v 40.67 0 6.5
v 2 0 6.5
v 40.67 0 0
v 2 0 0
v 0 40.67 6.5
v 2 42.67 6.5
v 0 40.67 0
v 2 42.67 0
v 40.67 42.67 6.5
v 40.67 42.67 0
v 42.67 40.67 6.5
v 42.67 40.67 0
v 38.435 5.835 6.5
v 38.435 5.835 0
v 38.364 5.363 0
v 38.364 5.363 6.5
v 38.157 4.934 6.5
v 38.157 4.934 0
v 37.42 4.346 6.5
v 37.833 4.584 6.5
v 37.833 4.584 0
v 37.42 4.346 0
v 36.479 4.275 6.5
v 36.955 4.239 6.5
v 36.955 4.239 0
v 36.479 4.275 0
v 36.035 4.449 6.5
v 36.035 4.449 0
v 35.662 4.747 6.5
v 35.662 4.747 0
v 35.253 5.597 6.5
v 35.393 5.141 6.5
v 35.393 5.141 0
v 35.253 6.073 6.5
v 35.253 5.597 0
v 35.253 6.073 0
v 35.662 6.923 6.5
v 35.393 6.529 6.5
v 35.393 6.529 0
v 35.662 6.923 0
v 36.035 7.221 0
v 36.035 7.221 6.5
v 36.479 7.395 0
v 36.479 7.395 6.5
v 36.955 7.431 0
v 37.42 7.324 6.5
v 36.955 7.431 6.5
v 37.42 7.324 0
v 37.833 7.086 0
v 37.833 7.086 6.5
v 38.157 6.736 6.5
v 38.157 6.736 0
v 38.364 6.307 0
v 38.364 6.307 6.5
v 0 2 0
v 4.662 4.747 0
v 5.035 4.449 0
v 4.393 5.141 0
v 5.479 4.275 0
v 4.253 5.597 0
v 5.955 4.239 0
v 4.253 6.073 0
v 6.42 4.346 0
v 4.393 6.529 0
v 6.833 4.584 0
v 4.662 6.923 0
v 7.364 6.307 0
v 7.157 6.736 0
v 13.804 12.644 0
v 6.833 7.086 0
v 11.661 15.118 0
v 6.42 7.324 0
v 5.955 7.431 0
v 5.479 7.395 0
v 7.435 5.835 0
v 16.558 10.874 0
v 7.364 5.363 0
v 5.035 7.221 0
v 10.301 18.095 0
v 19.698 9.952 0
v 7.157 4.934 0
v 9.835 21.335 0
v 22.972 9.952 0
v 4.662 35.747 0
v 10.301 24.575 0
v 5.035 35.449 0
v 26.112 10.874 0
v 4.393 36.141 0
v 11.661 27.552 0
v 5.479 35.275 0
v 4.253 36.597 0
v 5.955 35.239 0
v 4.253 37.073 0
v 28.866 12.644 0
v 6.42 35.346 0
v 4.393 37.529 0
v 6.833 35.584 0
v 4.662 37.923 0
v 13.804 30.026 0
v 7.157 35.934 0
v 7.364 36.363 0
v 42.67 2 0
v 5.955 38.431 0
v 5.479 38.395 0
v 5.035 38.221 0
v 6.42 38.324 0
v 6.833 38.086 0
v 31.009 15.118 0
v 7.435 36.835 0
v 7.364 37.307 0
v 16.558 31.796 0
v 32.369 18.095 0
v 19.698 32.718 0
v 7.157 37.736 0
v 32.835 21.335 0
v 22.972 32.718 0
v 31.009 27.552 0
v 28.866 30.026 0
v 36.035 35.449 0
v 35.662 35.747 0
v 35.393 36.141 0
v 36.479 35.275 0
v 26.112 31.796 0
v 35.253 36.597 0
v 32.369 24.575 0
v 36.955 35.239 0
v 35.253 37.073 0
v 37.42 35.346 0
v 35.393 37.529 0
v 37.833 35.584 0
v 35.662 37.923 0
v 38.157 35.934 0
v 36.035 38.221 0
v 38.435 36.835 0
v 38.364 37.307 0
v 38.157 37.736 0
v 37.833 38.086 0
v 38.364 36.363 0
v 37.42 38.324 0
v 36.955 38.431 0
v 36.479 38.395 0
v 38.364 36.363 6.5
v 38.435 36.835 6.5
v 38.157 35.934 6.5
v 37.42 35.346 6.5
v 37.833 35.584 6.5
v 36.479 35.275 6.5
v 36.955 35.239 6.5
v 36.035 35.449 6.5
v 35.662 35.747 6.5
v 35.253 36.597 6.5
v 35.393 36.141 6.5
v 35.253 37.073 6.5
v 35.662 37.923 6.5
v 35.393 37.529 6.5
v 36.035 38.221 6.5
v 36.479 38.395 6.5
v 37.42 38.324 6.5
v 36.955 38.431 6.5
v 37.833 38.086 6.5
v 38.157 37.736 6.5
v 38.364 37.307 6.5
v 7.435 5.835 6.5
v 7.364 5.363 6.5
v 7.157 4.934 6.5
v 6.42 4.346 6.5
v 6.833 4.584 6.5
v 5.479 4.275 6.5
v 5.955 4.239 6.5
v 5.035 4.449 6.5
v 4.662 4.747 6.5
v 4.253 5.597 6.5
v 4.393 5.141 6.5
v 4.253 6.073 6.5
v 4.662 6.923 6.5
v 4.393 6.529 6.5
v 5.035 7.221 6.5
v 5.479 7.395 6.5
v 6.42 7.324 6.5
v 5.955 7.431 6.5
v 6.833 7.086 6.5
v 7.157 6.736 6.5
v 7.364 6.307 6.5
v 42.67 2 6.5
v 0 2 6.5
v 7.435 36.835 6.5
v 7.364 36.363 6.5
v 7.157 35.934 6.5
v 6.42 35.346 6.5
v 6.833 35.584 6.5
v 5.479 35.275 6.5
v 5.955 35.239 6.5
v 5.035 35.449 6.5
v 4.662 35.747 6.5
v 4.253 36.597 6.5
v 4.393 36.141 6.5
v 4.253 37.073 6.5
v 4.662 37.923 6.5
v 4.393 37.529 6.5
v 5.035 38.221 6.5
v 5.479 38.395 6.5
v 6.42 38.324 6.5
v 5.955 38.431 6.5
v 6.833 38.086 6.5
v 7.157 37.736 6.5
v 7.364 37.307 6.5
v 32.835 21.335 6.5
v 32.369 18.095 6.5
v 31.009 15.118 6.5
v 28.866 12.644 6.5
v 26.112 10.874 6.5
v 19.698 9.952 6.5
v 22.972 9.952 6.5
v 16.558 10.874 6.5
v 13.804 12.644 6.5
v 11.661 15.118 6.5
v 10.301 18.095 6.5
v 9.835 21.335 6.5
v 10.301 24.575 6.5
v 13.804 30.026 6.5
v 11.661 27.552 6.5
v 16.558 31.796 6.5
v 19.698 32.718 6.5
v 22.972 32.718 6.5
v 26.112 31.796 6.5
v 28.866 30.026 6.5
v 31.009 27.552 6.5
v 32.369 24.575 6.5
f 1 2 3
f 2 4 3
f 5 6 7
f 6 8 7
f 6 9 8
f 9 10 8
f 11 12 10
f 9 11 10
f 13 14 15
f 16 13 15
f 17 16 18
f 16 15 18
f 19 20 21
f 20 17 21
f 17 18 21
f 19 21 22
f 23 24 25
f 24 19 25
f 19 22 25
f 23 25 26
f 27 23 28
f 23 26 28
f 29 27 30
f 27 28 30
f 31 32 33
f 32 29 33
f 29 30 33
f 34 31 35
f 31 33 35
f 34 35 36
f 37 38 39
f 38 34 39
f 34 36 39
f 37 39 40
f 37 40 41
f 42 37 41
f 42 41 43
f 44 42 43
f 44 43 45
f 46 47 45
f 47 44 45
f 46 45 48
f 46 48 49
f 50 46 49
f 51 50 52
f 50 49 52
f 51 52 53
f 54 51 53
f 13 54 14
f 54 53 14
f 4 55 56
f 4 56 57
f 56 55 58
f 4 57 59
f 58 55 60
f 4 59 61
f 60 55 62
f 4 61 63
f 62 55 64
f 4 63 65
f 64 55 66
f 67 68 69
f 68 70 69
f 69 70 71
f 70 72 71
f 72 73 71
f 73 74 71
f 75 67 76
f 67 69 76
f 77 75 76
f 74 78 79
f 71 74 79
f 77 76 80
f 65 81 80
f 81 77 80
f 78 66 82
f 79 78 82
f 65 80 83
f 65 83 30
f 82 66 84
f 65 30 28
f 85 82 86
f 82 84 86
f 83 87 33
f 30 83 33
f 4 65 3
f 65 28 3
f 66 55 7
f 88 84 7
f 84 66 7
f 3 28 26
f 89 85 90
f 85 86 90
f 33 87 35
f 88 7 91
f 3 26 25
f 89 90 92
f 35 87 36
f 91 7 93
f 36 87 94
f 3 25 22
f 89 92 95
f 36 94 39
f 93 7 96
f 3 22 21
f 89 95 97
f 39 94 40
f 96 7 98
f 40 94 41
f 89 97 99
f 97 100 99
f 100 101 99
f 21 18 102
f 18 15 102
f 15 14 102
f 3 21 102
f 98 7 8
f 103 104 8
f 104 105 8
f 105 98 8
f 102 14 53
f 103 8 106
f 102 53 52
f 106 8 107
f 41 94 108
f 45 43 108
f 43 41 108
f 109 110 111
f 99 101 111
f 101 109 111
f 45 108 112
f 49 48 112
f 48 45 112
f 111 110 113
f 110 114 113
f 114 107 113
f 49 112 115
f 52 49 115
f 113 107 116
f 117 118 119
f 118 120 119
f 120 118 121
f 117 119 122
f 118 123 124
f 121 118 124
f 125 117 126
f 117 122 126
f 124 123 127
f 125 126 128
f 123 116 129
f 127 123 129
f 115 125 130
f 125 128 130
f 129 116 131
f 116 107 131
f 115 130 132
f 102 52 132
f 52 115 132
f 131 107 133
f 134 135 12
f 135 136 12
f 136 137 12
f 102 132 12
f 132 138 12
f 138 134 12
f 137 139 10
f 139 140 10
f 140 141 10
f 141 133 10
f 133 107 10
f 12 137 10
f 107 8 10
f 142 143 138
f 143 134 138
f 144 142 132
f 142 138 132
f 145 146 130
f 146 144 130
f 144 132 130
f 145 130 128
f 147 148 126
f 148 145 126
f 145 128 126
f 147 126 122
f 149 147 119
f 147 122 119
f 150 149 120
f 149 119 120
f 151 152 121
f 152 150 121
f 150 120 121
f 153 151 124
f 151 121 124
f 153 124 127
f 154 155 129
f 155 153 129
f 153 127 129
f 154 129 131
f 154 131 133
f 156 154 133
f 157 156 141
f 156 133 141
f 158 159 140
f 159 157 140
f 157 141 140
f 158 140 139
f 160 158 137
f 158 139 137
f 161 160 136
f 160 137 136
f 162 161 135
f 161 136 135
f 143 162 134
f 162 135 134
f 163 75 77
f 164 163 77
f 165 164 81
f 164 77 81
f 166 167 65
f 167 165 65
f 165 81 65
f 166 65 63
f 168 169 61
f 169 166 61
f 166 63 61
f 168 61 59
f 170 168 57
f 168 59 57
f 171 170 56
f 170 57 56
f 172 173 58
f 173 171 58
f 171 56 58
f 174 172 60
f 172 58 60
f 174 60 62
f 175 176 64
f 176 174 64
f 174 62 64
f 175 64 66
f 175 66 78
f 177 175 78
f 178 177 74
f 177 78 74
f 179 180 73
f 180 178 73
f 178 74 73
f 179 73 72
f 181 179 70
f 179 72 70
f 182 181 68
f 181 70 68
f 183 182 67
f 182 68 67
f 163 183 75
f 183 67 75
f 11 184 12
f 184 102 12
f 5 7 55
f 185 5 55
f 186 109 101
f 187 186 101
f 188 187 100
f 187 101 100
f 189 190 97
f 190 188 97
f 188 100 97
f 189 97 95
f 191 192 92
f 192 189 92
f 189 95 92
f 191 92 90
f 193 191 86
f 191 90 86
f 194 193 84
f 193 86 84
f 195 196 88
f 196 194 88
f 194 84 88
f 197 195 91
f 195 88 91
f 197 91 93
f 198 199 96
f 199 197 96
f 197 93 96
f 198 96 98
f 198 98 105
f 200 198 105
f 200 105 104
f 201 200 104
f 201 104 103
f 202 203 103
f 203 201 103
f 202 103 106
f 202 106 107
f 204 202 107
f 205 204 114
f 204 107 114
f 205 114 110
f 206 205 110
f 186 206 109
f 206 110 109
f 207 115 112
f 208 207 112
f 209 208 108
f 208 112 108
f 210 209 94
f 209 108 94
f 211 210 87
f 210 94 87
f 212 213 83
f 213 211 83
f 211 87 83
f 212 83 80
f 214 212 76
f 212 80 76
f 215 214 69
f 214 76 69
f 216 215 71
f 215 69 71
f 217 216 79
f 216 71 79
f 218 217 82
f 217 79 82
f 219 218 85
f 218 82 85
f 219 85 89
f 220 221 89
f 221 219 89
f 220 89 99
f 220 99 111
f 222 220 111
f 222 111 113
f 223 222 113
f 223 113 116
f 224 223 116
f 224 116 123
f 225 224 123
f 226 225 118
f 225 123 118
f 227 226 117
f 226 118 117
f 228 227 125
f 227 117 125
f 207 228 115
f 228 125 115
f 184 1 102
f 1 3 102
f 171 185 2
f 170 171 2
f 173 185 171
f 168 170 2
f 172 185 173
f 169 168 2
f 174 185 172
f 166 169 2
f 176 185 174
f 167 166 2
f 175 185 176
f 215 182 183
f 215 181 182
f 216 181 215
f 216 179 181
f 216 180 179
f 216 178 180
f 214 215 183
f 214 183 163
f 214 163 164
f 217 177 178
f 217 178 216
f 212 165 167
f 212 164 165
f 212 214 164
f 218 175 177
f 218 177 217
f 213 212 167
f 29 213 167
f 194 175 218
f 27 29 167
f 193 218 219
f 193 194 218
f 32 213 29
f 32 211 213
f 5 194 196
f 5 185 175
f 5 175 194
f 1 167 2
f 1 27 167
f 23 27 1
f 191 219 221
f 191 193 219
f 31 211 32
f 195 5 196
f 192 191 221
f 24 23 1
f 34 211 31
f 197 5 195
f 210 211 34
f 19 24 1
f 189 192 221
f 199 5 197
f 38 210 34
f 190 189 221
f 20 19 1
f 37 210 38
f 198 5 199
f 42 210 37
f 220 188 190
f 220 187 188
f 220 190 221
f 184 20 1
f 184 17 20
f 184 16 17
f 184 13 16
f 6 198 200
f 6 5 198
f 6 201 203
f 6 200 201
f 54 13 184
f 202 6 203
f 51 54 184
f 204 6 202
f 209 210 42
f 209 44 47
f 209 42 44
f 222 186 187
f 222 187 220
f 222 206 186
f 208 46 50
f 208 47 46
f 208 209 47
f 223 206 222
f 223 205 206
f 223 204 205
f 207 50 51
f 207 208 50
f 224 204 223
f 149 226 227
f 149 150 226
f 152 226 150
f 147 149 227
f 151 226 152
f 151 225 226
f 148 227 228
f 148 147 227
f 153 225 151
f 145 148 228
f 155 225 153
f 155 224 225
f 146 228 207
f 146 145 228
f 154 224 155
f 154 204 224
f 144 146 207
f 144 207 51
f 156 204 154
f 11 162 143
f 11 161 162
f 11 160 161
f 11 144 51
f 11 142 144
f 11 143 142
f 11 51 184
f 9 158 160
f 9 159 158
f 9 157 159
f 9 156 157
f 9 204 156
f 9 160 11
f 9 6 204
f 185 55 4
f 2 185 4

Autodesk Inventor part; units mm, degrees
ref_plane "YZ Plane" through (0, 0, 0) normal (1, 0, 0) x (0, 1, 0)
ref_plane "XZ Plane" through (0, 0, 0) normal (0, 1, 0) x (-1, 0, 0)
ref_plane "XY Plane" through (0, 0, 0) normal (0, 0, 1) x (1, 0, 0)
sketch "Sketch1" plane through (0, 0, 0) normal (0, 0, 1) x (1, 0, 0)
  line L0 (2, 0) -> (40.67, 0)
  line L1 (42.67, 2) -> (42.67, 40.67)
  line L2 (40.67, 42.67) -> (2, 42.67)
  line L3 (0, 40.67) -> (0, 2)
  line L4 (2, 42.67) -> (0, 40.67)
  line L5 (0, 2) -> (2, 0)
  line L6 (40.67, 0) -> (42.67, 2)
  line L7 (42.67, 40.67) -> (40.67, 42.67)
  circle A0 centre (21.335, 21.335) radius 11.5
  line L8 (5.835, 36.835) -> (36.835, 36.835) construction
  line L9 (36.835, 36.835) -> (36.835, 5.835) construction
  line L10 (36.835, 5.835) -> (5.835, 5.835) construction
  line L11 (5.835, 5.835) -> (5.835, 36.835) construction
  circle A1 centre (5.835, 36.835) radius 1.6
  circle A2 centre (36.835, 36.835) radius 1.6
  circle A3 centre (36.835, 5.835) radius 1.6
  circle A4 centre (5.835, 5.835) radius 1.6
  point P0 (0, 0)
  point P1 (42.67, 42.67)
  point P2 (42.67, 0)
  point P3 (0, 42.67)
  point P4 (42.67, 21.335)
  point P5 (21.335, 42.67)
  point P6 (21.335, 36.835)
  point P7 (36.835, 21.335)
  dimension "d0" = 2
  dimension "d1" = 2
  dimension "d2" = 2
  dimension "d3" = 2
  dimension "d4" = 2
  dimension "d5" = 2
  dimension "d6" = 2
  dimension "d7" = 2
  dimension "d8" = 42.67
  dimension "d9" = 42.67
  dimension "d10" = 23
  dimension "d11" = 31
  dimension "d12" = 31
  dimension "d13" = 3.2
  dimension "d14" = 3.2
  dimension "d15" = 3.2
  dimension "d16" = 3.2
extrude "Extrusion1" add sketch "Sketch1" along normal blind 6.5
equation "\"d1\" = d0"
equation "\"d2\" = d0"
equation "\"d3\" = d2"
equation "\"d4\" = d0"
equation "\"d5\" = d4"
equation "\"d6\" = d0"
equation "\"d7\" = d6"
properties part number "x_motor_spacer"
